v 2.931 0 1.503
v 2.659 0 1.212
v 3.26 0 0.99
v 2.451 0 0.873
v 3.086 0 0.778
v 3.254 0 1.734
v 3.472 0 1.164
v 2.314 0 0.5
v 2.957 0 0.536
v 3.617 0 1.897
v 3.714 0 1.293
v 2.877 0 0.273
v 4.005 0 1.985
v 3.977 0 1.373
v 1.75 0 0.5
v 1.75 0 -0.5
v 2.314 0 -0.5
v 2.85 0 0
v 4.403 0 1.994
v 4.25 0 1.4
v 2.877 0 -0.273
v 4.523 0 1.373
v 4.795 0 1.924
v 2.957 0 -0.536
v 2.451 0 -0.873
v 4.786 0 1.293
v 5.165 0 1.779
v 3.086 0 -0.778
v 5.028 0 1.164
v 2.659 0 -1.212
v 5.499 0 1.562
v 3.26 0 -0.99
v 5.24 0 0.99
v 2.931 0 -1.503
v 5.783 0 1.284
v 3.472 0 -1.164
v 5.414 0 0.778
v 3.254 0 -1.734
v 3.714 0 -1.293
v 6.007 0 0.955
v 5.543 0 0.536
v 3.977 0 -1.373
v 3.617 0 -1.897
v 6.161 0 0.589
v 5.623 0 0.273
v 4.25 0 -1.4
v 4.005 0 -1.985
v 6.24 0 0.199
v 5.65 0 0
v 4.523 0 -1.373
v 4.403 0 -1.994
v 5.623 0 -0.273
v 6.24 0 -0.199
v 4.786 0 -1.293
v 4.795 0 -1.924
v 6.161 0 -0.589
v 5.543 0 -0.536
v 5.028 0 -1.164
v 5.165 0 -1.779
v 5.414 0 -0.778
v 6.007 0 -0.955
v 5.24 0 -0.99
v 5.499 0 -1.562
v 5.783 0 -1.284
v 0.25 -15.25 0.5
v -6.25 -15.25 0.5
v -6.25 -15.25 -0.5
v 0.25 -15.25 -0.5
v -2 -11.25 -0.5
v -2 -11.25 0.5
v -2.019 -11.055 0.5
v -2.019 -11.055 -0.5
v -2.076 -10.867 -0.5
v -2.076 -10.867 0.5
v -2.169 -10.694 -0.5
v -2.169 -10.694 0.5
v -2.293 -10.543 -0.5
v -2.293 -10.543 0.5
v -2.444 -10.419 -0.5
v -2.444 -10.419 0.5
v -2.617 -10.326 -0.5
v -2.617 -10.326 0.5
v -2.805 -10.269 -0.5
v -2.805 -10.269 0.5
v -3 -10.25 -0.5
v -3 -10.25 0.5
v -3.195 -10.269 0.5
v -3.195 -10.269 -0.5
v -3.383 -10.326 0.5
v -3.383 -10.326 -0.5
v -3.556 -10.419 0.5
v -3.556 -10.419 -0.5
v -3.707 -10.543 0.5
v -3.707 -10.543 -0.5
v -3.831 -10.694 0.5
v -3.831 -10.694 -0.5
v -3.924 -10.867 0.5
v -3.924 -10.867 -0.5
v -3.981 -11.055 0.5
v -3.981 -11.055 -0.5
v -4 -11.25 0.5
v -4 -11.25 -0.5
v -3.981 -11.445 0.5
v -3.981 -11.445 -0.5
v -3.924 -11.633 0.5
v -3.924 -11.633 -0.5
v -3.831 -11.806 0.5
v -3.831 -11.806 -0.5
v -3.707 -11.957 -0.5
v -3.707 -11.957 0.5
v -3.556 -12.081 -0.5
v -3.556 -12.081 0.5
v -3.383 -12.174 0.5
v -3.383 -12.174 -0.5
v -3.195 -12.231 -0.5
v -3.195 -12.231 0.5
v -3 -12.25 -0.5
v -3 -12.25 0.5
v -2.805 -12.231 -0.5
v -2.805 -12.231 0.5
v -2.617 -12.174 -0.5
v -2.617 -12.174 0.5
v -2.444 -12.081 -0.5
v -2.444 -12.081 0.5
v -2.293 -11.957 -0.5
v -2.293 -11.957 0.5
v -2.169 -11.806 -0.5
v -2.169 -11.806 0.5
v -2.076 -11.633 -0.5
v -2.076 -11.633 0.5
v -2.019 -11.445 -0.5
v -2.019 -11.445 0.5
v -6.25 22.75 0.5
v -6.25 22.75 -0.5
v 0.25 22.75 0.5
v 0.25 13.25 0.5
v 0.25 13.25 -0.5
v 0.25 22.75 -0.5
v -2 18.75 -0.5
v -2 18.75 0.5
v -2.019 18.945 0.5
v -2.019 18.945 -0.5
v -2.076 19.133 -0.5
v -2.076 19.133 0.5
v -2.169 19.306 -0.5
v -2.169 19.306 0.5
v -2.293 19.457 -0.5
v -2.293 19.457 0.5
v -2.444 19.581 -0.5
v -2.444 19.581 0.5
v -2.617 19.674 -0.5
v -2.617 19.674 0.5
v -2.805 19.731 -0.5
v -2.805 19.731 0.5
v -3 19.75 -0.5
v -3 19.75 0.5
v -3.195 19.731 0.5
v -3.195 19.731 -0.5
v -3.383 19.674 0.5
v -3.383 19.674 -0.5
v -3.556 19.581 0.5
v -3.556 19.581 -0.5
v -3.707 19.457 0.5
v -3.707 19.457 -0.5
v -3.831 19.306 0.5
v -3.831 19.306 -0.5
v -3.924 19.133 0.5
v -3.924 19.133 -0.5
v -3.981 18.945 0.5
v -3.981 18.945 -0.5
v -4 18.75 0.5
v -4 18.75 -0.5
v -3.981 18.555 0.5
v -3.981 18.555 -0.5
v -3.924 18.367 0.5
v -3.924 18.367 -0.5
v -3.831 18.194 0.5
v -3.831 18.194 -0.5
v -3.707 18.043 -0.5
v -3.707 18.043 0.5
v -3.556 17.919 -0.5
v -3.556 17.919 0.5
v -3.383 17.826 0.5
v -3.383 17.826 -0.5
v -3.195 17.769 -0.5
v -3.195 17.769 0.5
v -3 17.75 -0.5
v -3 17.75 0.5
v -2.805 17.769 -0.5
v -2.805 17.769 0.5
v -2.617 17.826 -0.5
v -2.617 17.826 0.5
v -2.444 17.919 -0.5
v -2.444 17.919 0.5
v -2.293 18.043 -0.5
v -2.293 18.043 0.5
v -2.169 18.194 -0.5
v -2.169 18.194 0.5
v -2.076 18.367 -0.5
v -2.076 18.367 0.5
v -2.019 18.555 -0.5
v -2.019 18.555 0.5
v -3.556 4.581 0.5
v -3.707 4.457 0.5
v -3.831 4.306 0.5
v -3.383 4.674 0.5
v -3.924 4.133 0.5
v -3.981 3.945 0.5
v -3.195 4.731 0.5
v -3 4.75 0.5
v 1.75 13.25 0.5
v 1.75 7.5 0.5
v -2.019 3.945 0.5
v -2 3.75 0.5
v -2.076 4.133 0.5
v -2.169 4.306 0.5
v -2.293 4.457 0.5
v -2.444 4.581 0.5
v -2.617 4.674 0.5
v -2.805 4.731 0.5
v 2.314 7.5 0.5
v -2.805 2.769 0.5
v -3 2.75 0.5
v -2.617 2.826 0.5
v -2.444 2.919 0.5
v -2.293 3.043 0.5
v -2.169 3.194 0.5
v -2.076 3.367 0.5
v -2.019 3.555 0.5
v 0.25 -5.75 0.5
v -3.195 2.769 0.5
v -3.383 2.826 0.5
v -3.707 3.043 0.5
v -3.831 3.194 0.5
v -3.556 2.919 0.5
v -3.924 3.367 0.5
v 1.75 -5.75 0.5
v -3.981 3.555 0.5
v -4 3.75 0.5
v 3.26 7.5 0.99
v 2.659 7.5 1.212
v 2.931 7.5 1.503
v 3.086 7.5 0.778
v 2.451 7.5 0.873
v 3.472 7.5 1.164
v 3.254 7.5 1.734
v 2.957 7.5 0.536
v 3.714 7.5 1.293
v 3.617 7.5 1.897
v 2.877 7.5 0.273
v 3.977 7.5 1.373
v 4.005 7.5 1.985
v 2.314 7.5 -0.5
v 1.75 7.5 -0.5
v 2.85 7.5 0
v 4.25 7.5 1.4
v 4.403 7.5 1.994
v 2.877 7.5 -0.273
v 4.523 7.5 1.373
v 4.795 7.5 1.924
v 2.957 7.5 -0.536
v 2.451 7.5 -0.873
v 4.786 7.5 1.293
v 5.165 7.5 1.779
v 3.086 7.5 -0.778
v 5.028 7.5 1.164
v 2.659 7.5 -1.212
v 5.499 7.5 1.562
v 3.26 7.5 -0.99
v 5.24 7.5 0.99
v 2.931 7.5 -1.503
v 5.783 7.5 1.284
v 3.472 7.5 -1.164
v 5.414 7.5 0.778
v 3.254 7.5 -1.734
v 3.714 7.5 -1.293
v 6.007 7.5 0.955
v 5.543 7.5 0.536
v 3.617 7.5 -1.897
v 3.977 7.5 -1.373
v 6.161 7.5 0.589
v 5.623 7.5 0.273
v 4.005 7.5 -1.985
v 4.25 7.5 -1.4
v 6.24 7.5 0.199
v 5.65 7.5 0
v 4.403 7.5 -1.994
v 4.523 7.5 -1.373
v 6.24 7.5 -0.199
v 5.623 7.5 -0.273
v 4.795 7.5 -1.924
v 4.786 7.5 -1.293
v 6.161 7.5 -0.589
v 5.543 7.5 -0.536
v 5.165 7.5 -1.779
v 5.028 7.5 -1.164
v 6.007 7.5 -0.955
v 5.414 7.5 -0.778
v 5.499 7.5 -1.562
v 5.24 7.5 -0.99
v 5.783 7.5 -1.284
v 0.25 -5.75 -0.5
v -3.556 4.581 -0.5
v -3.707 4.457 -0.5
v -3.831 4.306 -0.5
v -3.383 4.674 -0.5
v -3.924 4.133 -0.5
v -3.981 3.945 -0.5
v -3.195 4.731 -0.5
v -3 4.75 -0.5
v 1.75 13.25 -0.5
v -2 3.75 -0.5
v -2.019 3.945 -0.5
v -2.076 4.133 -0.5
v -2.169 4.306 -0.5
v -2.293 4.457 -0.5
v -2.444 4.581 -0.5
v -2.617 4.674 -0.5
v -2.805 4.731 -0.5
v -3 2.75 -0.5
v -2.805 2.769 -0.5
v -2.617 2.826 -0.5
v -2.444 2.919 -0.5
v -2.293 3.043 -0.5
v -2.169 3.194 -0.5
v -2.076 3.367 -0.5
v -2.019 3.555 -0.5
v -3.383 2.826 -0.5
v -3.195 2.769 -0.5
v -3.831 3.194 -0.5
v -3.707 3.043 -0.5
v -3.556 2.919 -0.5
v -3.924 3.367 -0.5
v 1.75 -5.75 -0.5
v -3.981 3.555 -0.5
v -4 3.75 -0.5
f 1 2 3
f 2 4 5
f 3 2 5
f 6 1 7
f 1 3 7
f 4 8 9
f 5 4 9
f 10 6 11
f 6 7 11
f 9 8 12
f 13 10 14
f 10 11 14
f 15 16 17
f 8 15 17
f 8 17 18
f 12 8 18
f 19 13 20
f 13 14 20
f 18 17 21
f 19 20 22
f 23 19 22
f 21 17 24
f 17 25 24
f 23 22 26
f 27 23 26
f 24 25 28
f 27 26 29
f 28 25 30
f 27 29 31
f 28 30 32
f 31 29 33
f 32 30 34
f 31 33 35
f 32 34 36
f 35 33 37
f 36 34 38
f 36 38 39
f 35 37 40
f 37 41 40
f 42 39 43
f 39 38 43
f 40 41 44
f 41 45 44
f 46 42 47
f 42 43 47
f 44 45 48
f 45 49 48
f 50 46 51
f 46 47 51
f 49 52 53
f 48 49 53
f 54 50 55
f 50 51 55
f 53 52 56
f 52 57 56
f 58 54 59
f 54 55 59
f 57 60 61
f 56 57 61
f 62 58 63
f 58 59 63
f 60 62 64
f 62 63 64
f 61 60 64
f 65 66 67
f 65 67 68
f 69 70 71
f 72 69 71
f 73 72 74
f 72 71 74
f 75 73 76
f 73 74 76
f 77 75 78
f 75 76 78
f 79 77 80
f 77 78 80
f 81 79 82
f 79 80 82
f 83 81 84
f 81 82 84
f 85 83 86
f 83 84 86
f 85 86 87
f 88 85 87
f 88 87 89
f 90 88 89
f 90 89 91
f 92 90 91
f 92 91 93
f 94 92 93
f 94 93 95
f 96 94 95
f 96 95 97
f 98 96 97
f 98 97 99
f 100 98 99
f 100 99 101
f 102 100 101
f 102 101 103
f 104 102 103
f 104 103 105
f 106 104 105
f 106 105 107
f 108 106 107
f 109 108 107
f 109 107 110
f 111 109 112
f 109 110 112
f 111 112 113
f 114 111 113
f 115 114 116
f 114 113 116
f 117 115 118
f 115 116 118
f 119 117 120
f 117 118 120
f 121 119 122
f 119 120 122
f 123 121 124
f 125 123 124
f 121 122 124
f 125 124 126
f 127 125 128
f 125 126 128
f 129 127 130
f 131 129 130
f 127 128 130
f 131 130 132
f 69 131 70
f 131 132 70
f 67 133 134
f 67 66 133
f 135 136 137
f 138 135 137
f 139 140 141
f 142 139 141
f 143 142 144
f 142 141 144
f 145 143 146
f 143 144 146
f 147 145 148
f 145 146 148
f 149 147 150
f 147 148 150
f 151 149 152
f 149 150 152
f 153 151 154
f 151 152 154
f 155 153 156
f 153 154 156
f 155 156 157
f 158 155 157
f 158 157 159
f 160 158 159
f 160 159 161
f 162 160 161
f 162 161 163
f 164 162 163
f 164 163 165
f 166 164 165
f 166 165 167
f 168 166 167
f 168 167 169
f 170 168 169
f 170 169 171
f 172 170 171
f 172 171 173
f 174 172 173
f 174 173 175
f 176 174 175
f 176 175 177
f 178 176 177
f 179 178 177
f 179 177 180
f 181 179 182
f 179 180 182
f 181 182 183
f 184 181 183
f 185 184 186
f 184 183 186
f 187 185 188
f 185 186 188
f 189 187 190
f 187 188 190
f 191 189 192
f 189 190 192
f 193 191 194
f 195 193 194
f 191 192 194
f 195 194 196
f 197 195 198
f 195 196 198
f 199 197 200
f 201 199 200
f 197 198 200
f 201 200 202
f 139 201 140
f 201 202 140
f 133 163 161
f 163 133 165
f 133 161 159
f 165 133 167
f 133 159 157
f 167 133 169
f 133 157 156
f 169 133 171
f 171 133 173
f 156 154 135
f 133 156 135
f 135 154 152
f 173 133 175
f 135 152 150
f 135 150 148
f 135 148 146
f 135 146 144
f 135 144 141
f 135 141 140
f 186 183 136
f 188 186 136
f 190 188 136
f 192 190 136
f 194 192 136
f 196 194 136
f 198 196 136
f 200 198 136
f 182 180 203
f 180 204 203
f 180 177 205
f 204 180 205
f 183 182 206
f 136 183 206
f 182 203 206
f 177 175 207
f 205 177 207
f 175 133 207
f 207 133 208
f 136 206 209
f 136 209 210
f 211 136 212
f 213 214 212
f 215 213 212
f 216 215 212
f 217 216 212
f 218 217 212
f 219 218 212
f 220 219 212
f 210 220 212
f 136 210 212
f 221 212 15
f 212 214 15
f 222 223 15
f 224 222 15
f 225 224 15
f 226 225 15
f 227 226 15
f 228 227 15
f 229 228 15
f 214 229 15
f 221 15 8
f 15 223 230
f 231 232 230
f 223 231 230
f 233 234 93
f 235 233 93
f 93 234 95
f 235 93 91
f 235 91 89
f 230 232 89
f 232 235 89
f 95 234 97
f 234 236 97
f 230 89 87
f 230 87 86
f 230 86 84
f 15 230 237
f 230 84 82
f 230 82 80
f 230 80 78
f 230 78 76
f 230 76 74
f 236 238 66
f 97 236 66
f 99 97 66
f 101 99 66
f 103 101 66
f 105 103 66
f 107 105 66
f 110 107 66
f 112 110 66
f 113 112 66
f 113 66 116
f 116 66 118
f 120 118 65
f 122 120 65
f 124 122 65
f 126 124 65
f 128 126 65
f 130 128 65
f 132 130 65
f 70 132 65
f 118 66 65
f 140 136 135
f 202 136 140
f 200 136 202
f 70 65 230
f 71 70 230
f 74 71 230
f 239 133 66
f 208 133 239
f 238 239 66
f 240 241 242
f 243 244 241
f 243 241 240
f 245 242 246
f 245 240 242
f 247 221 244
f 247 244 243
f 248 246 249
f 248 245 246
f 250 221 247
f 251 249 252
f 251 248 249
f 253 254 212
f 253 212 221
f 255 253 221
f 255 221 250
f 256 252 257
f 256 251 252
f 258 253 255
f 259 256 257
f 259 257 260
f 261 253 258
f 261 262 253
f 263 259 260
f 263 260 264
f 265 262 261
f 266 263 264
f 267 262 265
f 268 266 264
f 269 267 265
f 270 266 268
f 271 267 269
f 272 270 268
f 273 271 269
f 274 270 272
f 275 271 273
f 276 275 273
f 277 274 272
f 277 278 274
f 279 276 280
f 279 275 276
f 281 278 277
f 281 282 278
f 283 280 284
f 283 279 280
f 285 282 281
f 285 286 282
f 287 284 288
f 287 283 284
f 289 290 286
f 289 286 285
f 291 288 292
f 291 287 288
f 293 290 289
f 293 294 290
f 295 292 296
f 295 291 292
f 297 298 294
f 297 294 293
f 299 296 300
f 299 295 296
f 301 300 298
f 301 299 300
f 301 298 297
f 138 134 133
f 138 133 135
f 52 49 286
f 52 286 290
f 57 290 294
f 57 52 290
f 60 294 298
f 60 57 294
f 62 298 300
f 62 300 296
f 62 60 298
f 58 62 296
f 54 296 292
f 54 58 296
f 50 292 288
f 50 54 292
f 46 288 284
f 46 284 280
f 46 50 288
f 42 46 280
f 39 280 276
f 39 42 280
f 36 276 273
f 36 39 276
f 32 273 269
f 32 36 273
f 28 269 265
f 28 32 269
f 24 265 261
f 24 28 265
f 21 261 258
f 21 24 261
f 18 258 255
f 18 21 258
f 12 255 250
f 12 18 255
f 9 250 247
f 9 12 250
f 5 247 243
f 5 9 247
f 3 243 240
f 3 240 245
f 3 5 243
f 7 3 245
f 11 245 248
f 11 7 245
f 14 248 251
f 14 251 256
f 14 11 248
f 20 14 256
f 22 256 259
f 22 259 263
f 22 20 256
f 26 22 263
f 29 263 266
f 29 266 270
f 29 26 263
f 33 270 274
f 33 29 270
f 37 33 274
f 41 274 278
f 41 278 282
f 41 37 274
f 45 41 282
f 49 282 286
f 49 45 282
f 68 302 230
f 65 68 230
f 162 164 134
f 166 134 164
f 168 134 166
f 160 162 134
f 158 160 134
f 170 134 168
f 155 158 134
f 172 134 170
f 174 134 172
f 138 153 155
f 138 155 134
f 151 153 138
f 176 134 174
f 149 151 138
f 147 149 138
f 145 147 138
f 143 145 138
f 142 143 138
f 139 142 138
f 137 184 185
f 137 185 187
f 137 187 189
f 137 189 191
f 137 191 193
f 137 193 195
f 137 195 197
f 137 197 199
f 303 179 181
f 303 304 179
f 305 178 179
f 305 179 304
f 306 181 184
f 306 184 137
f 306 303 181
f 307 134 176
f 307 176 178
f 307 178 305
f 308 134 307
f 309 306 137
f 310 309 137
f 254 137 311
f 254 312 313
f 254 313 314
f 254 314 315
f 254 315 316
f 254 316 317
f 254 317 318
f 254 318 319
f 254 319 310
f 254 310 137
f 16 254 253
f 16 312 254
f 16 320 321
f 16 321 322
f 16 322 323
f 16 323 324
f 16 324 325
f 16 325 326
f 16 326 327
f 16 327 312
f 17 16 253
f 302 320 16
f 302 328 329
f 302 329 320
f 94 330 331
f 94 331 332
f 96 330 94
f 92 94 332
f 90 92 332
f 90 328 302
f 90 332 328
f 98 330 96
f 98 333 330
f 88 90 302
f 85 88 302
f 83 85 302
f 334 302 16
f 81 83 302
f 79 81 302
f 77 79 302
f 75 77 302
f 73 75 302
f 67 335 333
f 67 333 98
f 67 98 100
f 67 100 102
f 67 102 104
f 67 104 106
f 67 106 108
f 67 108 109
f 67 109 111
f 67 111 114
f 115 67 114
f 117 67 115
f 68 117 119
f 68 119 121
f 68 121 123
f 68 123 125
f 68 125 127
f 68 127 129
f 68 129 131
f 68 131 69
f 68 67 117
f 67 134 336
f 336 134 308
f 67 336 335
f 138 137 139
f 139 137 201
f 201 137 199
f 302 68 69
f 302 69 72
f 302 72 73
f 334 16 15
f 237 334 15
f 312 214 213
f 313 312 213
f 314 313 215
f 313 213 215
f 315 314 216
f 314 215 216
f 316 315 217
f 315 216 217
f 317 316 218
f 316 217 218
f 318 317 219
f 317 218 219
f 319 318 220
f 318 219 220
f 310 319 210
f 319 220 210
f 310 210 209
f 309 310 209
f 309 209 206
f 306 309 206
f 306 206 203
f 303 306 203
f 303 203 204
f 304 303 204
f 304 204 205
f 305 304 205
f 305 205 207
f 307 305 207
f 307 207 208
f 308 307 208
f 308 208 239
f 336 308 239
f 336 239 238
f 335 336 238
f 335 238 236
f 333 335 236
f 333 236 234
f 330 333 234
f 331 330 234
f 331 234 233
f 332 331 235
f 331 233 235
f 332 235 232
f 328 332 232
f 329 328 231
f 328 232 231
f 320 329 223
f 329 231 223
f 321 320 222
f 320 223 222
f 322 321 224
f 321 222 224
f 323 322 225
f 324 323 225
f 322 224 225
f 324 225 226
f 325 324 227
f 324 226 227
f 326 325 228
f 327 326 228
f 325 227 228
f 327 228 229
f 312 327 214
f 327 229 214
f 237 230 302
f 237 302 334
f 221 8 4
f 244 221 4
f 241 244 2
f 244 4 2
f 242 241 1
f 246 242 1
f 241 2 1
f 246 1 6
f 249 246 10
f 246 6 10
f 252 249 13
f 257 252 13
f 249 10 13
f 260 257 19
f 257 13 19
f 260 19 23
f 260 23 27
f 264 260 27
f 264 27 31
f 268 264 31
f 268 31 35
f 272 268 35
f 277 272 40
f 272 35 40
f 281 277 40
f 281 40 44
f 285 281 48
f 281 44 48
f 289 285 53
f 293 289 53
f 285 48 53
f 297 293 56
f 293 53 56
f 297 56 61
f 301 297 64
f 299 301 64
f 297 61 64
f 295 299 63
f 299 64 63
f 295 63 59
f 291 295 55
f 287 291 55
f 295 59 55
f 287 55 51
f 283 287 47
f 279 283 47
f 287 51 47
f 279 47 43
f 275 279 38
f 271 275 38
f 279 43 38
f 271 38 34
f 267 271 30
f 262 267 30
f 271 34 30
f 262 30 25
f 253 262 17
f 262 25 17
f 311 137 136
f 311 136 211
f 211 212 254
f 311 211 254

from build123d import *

# Parameters (mm, degrees)
SKETCH1_R           = 1.4
BOSS_EXTRUDE1_DEPTH = 7.5
SKETCH2_W           = 8
SKETCH2_H           = 1
BOSS_EXTRUDE2_DEPTH = 5.75
SKETCH3_W           = 8
SKETCH3_H           = 1
BOSS_EXTRUDE3_DEPTH = 5.75
SKETCH4_W           = 6.5
SKETCH4_H           = 1
BOSS_EXTRUDE4_DEPTH = 9.5
SKETCH5_W           = 6.5
SKETCH5_H           = 1
BOSS_EXTRUDE5_DEPTH = 9.5
CUT_EXTRUDE1_REACH  = 4.5
SKETCH6_R           = 1


with BuildPart() as part:
    # Sketch1 → Boss-Extrude1 (new body)
    with BuildSketch(Plane(origin=(0, 0, 0), x_dir=(1, 0, 0), z_dir=(0, 1, 0))):
        with BuildLine():
            Line((2.313508327, 0.5), (-6.25, 0.5))
            Line((-6.25, 0.5), (-6.25, -0.5))
            Line((-6.25, -0.5), (2.313508327, -0.5))
            ThreePointArc((2.313508327, -0.5), (6.25, 0), (2.313508327, 0.5))
        make_face()
        with Locations((4.25, 0)):
            Circle(SKETCH1_R, mode=Mode.SUBTRACT)
    extrude(amount=BOSS_EXTRUDE1_DEPTH)

    # Sketch2 → Boss-Extrude2 (add)
    with BuildSketch(Plane(origin=(0, 7.5, 0), x_dir=(1, 0, 0), z_dir=(0, 1, 0))):
        with Locations((-2.25, 0)):
            Rectangle(SKETCH2_W, SKETCH2_H)
    extrude(amount=BOSS_EXTRUDE2_DEPTH)

    # Sketch3 → Boss-Extrude3 (add)
    with BuildSketch(Plane.XZ):
        with Locations((-2.25, 0)):
            Rectangle(SKETCH3_W, SKETCH3_H)
    extrude(amount=BOSS_EXTRUDE3_DEPTH)

    # Sketch4 → Boss-Extrude4 (add)
    with BuildSketch(Plane.XZ.offset(5.75)):
        with Locations((-3, 0)):
            Rectangle(SKETCH4_W, SKETCH4_H)
    extrude(amount=BOSS_EXTRUDE4_DEPTH)

    # Sketch5 → Boss-Extrude5 (add)
    with BuildSketch(Plane(origin=(0, 13.25, 0), x_dir=(1, 0, 0), z_dir=(0, 1, 0))):
        with Locations((-3, 0)):
            Rectangle(SKETCH5_W, SKETCH5_H)
    extrude(amount=BOSS_EXTRUDE5_DEPTH)

    # Sketch6 → Cut-Extrude1 (cut, up to next)
    with BuildSketch(Plane.XY.offset(0.5), mode=Mode.PRIVATE) as cut_extrude1_sk1:
        with Locations((-3, 18.75)):
            Circle(SKETCH6_R)
    cut_extrude1_tool1 = extrude(cut_extrude1_sk1.sketch, amount=-CUT_EXTRUDE1_REACH, mode=Mode.PRIVATE) & part.part
    add(cut_extrude1_tool1.solids().sort_by_distance((-3, 18.75, 0.5))[0], mode=Mode.SUBTRACT)
    # Sketch6 → Cut-Extrude1 (cut, up to next)
    with BuildSketch(Plane.XY.offset(0.5), mode=Mode.PRIVATE) as cut_extrude1_sk2:
        with Locations((-3, 3.75)):
            Circle(SKETCH6_R)
    cut_extrude1_tool2 = extrude(cut_extrude1_sk2.sketch, amount=-CUT_EXTRUDE1_REACH, mode=Mode.PRIVATE) & part.part
    add(cut_extrude1_tool2.solids().sort_by_distance((-3, 3.75, 0.5))[0], mode=Mode.SUBTRACT)
    # Sketch6 → Cut-Extrude1 (cut, up to next)
    with BuildSketch(Plane.XY.offset(0.5), mode=Mode.PRIVATE) as cut_extrude1_sk3:
        with Locations((-3, -11.25)):
            Circle(SKETCH6_R)
    cut_extrude1_tool3 = extrude(cut_extrude1_sk3.sketch, amount=-CUT_EXTRUDE1_REACH, mode=Mode.PRIVATE) & part.part
    add(cut_extrude1_tool3.solids().sort_by_distance((-3, -11.25, 0.5))[0], mode=Mode.SUBTRACT)


solid = part.part
